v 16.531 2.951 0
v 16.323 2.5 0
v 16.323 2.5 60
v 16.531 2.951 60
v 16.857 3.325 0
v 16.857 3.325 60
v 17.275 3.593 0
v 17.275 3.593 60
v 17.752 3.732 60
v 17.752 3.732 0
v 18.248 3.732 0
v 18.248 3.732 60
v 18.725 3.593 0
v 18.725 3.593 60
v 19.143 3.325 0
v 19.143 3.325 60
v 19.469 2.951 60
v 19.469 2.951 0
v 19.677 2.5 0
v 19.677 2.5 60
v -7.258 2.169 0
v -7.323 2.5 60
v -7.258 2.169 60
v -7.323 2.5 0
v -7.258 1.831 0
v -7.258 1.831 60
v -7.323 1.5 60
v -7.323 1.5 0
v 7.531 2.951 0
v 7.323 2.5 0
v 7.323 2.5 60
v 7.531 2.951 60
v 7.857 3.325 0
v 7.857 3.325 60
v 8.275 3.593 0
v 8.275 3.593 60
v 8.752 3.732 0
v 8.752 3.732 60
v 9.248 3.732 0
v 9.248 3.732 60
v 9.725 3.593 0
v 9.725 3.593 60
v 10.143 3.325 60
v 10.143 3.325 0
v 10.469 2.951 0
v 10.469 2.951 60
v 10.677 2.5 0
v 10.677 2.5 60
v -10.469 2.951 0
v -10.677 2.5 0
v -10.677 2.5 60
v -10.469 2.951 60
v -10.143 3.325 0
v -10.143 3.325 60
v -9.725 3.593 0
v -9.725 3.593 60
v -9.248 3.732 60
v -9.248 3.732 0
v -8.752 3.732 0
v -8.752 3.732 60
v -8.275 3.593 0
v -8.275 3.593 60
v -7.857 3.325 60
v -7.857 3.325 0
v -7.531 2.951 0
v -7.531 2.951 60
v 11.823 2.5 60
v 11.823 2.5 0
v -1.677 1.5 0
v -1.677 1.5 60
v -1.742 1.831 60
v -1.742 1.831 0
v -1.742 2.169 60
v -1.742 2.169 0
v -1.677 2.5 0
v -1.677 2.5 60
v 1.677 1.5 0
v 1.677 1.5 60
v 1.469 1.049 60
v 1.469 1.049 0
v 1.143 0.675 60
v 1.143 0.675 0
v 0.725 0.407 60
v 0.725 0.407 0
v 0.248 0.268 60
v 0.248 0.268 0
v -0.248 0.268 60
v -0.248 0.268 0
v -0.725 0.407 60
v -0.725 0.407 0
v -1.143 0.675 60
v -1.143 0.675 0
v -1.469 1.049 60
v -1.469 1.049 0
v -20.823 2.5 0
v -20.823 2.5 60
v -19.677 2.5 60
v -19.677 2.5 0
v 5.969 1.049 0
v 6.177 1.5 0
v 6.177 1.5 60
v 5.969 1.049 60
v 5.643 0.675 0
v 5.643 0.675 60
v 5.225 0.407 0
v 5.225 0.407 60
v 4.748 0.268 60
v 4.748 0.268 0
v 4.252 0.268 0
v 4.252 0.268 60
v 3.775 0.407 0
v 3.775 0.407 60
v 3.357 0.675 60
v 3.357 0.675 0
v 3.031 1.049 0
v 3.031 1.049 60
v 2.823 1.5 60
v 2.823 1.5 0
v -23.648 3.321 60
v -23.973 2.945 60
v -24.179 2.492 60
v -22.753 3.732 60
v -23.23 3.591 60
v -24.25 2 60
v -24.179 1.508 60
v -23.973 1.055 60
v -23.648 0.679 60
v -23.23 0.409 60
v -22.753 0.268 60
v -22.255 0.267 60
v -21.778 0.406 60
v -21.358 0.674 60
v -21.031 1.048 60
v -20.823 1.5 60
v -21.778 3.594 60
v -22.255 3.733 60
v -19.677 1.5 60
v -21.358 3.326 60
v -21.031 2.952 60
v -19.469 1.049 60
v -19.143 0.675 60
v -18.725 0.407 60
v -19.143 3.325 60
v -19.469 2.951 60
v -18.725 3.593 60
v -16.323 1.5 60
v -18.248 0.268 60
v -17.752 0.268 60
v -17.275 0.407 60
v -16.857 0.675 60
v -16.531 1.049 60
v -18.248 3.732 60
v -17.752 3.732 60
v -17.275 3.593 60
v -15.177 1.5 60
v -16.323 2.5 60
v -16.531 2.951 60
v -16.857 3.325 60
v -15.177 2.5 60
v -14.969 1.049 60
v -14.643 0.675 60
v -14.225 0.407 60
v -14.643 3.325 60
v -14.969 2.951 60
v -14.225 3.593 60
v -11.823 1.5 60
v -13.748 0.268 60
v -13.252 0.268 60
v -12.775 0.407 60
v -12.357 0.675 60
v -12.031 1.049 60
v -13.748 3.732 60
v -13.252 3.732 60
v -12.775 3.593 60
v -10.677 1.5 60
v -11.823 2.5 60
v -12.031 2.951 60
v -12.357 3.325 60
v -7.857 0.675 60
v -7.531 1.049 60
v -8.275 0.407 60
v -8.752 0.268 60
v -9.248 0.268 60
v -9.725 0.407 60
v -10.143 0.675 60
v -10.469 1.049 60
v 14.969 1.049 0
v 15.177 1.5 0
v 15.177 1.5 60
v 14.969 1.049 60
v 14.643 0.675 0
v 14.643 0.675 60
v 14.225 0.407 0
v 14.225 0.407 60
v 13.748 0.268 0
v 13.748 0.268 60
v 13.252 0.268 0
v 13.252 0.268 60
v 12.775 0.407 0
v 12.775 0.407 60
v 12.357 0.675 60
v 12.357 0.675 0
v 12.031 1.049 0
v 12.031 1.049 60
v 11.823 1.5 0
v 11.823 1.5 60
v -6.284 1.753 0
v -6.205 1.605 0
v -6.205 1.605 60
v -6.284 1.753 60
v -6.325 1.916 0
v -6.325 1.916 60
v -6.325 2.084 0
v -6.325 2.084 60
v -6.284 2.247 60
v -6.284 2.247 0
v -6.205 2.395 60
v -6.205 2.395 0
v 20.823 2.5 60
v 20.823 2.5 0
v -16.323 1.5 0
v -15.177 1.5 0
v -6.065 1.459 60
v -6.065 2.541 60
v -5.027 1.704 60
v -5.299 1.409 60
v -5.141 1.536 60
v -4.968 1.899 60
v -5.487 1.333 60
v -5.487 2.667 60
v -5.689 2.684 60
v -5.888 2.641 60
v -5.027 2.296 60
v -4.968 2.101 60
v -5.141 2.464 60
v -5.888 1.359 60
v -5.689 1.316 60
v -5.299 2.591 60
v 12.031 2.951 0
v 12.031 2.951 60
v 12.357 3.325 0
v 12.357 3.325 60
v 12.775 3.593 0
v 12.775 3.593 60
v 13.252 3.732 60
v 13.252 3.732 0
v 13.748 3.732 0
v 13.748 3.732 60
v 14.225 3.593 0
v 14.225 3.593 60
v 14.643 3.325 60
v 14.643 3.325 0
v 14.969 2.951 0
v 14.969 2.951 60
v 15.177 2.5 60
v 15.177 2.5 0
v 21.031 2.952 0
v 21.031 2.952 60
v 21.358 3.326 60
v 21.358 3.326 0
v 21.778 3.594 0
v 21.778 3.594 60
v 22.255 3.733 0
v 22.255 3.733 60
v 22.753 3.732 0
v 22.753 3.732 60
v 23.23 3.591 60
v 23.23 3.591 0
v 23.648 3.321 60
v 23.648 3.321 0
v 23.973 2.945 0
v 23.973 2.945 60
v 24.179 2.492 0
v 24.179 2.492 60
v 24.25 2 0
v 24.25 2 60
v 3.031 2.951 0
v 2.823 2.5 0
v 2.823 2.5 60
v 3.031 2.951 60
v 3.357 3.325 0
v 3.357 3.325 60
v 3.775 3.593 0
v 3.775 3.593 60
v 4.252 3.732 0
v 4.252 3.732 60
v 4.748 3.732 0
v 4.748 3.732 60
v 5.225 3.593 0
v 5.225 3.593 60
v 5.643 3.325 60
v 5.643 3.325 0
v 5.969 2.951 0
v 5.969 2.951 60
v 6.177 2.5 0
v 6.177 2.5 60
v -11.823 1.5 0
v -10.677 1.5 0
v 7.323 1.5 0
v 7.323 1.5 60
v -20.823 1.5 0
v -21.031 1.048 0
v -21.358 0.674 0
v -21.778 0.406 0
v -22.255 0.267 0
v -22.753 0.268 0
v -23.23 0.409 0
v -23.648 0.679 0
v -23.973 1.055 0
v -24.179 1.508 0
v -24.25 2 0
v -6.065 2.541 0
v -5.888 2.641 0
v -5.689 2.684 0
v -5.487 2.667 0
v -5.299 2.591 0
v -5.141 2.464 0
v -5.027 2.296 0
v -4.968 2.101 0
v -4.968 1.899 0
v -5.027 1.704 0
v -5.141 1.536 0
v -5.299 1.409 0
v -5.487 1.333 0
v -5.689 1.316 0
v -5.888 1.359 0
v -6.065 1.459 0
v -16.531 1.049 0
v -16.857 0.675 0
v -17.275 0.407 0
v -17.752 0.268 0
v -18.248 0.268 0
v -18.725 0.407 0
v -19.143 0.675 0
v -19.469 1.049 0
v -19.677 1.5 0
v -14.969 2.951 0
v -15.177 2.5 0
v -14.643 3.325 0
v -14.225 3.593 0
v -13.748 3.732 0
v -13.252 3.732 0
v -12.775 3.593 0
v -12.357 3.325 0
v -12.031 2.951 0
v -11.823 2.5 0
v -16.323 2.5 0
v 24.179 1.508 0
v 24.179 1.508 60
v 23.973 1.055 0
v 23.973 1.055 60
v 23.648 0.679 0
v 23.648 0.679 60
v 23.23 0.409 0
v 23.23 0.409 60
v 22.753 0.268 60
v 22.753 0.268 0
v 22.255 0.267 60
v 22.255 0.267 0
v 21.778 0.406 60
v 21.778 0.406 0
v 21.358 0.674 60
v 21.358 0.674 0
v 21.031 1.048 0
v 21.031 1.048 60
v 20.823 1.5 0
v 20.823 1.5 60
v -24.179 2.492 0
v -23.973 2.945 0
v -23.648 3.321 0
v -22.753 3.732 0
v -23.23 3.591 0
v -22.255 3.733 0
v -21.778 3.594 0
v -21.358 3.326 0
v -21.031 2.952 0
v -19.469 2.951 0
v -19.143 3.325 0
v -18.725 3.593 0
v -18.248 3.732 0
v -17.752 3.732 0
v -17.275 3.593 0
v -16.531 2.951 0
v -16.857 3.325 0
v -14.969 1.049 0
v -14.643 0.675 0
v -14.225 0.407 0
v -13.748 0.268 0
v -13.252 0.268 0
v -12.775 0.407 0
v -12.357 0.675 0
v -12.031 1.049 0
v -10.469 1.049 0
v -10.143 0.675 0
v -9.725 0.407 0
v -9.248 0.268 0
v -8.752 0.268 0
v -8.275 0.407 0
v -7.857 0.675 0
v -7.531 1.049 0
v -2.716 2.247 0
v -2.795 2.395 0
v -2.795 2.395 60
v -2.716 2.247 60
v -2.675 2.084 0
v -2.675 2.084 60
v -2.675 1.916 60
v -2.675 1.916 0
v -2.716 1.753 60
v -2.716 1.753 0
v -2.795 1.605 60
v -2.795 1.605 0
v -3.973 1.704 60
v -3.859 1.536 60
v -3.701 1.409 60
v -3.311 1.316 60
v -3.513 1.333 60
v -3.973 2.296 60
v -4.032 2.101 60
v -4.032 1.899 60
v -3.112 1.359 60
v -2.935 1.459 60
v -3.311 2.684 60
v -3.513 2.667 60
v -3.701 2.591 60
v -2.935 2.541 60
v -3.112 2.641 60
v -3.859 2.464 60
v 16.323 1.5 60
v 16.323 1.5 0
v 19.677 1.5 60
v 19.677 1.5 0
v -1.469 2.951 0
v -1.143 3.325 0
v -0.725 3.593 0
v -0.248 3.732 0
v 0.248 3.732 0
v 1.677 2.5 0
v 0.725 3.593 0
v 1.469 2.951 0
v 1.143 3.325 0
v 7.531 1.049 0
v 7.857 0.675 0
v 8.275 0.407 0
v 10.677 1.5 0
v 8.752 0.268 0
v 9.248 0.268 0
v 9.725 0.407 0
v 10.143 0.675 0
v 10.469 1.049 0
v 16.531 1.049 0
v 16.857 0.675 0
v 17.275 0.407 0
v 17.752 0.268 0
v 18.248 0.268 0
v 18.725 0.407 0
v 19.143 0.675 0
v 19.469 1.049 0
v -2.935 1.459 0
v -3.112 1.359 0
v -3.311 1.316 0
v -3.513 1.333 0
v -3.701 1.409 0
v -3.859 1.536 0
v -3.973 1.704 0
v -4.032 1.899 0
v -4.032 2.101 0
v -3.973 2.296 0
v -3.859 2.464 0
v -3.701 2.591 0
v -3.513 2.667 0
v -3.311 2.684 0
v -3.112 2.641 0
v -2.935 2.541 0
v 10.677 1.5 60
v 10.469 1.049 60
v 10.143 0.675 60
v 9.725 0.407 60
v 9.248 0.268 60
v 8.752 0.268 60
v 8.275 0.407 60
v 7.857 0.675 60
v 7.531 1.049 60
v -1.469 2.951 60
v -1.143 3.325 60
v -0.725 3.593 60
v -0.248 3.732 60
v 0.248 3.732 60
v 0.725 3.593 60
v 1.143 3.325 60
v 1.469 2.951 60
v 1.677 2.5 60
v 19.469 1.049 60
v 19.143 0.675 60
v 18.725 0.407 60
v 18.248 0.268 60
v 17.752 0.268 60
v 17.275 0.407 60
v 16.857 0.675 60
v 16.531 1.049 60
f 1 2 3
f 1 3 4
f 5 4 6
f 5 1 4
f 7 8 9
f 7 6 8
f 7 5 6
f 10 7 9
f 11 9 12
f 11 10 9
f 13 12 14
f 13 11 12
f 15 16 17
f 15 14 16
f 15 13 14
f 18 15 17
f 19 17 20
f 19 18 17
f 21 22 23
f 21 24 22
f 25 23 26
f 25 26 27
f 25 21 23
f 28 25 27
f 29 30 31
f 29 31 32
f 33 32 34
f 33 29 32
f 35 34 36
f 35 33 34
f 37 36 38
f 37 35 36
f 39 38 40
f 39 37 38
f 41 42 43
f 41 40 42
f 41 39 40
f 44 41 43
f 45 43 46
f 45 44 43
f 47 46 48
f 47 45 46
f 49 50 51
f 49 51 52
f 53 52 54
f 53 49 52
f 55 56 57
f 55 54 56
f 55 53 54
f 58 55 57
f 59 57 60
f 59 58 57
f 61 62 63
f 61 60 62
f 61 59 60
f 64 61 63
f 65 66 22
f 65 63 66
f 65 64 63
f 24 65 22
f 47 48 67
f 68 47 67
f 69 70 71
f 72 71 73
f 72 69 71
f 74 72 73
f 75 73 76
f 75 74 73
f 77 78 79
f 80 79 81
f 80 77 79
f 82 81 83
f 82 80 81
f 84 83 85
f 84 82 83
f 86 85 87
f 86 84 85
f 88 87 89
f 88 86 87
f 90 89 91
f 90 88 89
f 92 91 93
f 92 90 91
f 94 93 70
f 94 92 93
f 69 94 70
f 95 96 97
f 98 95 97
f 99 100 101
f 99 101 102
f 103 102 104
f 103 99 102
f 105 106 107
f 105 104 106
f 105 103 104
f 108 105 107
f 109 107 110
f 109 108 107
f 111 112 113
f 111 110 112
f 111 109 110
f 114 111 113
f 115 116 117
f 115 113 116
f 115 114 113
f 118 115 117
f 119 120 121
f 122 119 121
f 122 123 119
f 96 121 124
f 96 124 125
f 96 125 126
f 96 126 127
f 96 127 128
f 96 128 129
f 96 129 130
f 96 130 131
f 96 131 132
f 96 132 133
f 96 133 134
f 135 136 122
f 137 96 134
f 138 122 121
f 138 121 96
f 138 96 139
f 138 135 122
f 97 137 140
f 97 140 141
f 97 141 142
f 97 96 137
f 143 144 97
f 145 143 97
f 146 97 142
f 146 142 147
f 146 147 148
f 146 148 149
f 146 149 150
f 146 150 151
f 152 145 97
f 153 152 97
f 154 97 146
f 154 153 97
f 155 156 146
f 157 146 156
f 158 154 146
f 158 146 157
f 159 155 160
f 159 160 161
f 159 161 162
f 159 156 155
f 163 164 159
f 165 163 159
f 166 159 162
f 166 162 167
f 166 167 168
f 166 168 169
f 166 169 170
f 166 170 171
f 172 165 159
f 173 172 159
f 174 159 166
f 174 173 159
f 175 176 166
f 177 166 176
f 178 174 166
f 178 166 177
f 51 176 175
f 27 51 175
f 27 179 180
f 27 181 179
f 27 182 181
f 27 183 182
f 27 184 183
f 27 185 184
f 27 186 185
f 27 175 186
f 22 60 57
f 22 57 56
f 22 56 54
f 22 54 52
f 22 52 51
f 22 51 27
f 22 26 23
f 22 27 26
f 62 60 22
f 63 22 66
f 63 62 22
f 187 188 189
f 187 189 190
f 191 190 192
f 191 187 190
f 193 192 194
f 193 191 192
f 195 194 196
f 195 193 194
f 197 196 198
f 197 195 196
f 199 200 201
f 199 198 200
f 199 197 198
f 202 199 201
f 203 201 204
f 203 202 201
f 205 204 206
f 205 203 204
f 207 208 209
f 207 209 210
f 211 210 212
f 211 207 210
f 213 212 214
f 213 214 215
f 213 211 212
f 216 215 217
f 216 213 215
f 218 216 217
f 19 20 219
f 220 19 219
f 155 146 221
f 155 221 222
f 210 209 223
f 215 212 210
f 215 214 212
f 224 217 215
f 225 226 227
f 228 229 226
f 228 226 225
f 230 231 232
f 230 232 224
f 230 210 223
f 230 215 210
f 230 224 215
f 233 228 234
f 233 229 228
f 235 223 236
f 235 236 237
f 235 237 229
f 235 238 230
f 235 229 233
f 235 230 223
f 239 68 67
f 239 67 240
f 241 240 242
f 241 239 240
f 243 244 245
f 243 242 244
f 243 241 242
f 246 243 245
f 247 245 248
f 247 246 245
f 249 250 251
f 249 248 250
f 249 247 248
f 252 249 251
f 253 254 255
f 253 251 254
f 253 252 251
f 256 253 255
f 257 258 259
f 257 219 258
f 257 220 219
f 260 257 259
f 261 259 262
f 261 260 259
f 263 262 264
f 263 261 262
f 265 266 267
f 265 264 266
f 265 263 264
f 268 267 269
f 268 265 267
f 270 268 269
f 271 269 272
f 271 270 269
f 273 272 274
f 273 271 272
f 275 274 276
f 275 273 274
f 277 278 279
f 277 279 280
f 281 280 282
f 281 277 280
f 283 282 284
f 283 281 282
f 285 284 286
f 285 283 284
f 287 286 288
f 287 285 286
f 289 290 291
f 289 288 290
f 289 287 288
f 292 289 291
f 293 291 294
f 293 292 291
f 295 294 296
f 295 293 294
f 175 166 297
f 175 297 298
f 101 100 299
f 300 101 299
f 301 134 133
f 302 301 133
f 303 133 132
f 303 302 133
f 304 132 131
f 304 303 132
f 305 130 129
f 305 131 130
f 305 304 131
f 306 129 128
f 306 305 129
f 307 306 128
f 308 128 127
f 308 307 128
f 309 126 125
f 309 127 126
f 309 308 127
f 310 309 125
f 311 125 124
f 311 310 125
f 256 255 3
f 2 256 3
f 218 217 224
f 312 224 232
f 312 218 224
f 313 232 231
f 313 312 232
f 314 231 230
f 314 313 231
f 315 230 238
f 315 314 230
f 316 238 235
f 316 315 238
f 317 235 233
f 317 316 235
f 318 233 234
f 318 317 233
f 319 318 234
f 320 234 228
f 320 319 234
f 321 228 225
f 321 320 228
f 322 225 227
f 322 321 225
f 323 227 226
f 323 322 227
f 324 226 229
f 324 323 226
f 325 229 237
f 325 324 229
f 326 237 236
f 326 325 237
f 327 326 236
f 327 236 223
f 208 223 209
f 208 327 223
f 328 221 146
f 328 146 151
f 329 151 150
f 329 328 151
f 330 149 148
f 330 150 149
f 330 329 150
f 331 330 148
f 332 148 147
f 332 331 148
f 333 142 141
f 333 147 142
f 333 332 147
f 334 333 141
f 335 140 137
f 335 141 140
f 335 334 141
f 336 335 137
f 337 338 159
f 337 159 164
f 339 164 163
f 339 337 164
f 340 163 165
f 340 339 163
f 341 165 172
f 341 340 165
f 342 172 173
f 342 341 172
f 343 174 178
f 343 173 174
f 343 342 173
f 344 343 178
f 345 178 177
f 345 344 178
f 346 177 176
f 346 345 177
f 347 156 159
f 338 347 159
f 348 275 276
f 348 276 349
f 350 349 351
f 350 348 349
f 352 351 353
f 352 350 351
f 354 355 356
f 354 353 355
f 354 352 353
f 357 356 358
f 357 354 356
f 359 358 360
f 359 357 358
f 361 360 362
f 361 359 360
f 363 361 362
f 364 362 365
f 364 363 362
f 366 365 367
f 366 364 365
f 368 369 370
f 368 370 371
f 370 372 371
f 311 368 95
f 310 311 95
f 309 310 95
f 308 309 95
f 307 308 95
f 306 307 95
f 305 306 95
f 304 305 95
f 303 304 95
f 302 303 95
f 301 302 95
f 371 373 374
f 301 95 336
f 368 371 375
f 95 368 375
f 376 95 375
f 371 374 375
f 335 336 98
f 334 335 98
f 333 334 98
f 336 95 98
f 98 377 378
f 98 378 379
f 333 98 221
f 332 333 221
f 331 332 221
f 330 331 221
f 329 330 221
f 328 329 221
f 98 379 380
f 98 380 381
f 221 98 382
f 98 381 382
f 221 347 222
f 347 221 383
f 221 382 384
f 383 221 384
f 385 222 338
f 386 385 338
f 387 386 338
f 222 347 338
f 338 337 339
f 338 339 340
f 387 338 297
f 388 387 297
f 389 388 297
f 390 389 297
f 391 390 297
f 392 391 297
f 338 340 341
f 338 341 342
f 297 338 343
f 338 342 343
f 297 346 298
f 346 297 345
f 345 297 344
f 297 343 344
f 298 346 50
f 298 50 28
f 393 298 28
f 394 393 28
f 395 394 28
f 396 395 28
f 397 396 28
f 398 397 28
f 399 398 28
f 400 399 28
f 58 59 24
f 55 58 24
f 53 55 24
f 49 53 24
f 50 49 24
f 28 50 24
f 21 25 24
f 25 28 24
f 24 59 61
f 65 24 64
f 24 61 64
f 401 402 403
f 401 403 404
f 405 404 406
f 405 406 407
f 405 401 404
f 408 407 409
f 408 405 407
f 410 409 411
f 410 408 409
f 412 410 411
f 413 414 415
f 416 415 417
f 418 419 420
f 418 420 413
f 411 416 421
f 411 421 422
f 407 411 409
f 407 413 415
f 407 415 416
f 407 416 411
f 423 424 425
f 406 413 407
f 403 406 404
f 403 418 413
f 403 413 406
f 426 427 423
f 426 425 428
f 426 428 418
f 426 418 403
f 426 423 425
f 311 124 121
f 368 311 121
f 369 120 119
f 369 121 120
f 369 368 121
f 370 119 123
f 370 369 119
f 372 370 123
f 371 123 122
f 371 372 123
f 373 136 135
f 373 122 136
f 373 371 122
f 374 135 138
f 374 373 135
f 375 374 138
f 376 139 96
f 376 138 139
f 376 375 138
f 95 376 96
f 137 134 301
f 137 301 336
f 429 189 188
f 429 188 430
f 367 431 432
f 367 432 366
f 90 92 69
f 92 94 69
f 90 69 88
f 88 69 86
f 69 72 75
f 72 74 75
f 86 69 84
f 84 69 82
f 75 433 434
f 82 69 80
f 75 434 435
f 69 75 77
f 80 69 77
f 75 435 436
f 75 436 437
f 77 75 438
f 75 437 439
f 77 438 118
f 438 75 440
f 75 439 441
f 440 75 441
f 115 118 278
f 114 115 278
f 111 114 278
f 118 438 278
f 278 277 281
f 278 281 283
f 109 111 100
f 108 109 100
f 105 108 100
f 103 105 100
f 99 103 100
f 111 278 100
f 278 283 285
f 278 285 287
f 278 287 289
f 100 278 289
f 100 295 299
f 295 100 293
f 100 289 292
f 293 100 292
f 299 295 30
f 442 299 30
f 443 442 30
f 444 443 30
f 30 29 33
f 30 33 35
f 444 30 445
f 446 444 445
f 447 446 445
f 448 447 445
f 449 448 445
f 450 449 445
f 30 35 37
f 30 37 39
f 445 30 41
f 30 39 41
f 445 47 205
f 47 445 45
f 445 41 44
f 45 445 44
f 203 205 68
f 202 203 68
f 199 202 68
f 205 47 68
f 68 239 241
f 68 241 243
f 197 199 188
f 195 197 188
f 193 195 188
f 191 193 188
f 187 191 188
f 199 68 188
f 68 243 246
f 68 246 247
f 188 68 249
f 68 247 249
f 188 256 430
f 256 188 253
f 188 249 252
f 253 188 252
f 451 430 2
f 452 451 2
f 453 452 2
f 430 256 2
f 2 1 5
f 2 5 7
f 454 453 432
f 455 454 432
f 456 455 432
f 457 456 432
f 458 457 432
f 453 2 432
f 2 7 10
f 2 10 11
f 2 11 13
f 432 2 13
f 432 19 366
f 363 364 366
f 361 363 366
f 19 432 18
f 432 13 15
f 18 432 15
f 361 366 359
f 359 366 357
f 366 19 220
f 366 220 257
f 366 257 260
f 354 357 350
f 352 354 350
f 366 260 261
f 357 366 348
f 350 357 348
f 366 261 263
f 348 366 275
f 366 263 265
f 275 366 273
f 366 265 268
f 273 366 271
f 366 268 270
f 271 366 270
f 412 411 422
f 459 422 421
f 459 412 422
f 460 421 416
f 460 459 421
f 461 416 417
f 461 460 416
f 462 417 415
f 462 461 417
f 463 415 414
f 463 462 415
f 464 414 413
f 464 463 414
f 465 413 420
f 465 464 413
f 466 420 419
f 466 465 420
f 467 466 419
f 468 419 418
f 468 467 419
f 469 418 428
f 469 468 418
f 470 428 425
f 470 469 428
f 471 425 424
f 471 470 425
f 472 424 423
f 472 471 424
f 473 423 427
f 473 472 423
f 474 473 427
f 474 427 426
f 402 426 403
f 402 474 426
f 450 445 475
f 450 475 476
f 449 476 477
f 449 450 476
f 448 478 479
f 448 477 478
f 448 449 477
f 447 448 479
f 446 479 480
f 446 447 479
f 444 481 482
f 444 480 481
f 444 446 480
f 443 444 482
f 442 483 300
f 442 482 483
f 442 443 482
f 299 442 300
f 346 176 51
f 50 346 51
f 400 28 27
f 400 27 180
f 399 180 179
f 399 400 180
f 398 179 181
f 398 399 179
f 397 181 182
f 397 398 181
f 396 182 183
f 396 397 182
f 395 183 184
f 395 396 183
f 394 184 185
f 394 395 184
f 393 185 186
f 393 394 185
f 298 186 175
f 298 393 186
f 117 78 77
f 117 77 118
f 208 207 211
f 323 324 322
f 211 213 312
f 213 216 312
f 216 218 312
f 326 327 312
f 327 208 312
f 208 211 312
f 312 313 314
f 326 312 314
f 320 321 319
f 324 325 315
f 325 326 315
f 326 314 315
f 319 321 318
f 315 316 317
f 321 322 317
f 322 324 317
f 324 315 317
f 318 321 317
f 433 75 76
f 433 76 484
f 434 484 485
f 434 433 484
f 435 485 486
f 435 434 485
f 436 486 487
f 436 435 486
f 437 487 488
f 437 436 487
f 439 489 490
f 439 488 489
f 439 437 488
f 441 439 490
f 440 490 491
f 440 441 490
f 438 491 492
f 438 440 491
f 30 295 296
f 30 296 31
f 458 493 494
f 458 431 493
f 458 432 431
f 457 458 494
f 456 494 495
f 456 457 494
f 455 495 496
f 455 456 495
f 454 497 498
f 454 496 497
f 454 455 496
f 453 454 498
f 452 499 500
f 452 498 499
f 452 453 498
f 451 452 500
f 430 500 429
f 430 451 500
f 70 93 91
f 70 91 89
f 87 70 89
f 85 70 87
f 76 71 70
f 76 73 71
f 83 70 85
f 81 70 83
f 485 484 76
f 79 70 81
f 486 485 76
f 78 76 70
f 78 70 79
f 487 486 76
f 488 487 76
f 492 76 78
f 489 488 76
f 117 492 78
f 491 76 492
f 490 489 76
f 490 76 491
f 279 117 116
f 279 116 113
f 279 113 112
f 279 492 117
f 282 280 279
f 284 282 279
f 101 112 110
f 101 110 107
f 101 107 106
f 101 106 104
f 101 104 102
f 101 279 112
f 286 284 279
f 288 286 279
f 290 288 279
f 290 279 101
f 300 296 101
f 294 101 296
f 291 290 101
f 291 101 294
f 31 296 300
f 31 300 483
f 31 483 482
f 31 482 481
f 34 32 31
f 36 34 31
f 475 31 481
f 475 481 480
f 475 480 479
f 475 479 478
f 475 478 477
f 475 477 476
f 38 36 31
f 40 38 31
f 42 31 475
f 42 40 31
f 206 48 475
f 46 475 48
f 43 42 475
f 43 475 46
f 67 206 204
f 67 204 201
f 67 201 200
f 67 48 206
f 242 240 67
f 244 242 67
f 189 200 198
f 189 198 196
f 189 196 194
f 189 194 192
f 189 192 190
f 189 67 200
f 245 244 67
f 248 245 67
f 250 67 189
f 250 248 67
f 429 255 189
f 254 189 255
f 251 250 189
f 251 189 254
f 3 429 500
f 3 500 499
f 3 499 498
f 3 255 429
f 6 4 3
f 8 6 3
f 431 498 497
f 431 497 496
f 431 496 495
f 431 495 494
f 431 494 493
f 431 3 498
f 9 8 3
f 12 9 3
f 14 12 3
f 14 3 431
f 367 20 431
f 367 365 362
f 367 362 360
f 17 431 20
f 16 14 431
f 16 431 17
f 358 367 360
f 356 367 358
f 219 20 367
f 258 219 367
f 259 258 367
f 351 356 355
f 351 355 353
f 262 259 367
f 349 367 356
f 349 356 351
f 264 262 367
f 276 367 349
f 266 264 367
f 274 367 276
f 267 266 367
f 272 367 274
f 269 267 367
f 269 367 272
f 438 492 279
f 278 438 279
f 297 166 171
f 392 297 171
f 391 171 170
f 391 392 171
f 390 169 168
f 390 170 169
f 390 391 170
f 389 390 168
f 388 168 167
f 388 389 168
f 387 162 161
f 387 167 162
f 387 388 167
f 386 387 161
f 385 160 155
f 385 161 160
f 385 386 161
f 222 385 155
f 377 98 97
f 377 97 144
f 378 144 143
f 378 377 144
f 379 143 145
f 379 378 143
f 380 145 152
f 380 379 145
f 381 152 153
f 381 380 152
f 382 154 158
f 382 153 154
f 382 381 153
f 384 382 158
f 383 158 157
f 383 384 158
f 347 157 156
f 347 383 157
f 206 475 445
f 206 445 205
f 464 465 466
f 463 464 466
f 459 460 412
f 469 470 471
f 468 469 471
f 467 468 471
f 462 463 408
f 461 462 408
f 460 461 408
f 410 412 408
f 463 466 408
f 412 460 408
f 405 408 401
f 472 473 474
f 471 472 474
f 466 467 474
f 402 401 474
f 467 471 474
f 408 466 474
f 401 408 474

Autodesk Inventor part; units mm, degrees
ref_plane "YZ Plane" through (0, 0, 0) normal (1, 0, 0) x (0, 1, 0)
ref_plane "XZ Plane" through (0, 0, 0) normal (0, 1, 0) x (-1, 0, 0)
ref_plane "XY Plane" through (0, 0, 0) normal (0, 0, 1) x (1, 0, 0)
sketch "Sketch1" plane through (0, 0, 0) normal (0, 0, 1) x (1, 0, 0)
  line L0 (25, -2) -> (24.25, -2) projected
  line L1 (25, 2) -> (25, -2) projected
  line L2 (24.25, 2) -> (25, 2) projected
  arc A0 (20.8229, 1.5) -> (24.25, 2) centre (22.5, 2) ccw projected
  line L3 (19.6771, 1.5) -> (20.8229, 1.5) projected
  arc A1 (16.3229, 1.5) -> (19.6771, 1.5) centre (18, 2) ccw projected
  line L4 (15.1771, 1.5) -> (16.3229, 1.5) projected
  arc A2 (11.8229, 1.5) -> (15.1771, 1.5) centre (13.5, 2) ccw projected
  line L5 (10.6771, 1.5) -> (11.8229, 1.5) projected
  arc A3 (7.3229, 1.5) -> (10.6771, 1.5) centre (9, 2) ccw projected
  line L6 (6.1771, 1.5) -> (7.3229, 1.5) projected
  arc A4 (2.8229, 1.5) -> (6.1771, 1.5) centre (4.5, 2) ccw projected
  line L7 (1.6771, 1.5) -> (2.8229, 1.5) projected
  arc A5 (-1.6771, 1.5) -> (1.6771, 1.5) centre (0, 2) ccw projected
  line L8 (-2.8229, 1.5) -> (-1.6771, 1.5) projected
  arc A6 (-6.1771, 1.5) -> (-2.8229, 1.5) centre (-4.5, 2) ccw projected
  line L9 (-7.3229, 1.5) -> (-6.1771, 1.5) projected
  arc A7 (-10.6771, 1.5) -> (-7.3229, 1.5) centre (-9, 2) ccw projected
  line L10 (-11.8229, 1.5) -> (-10.6771, 1.5) projected
  arc A8 (-15.1771, 1.5) -> (-11.8229, 1.5) centre (-13.5, 2) ccw projected
  line L11 (-16.3229, 1.5) -> (-15.1771, 1.5) projected
  arc A9 (-19.6771, 1.5) -> (-16.3229, 1.5) centre (-18, 2) ccw projected
  line L12 (-20.8229, 1.5) -> (-19.6771, 1.5) projected
  arc A10 (-24.25, 2) -> (-20.8229, 1.5) centre (-22.5, 2) ccw projected
  line L13 (-25, 2) -> (-24.25, 2) projected
  line L14 (-25, -2) -> (-25, 2) projected
  line L15 (-24.25, -2) -> (-25, -2) projected
  arc A11 (-20.8229, -1.5) -> (-24.25, -2) centre (-22.5, -2) ccw projected
  line L16 (-19.6771, -1.5) -> (-20.8229, -1.5) projected
  arc A12 (-16.3229, -1.5) -> (-19.6771, -1.5) centre (-18, -2) ccw projected
  line L17 (-15.1771, -1.5) -> (-16.3229, -1.5) projected
  arc A13 (-11.8229, -1.5) -> (-15.1771, -1.5) centre (-13.5, -2) ccw projected
  line L18 (-10.6771, -1.5) -> (-11.8229, -1.5) projected
  arc A14 (-7.3229, -1.5) -> (-10.6771, -1.5) centre (-9, -2) ccw projected
  line L19 (-6.1771, -1.5) -> (-7.3229, -1.5) projected
  arc A15 (-2.8229, -1.5) -> (-6.1771, -1.5) centre (-4.5, -2) ccw projected
  line L20 (-1.6771, -1.5) -> (-2.8229, -1.5) projected
  arc A16 (1.6771, -1.5) -> (-1.6771, -1.5) centre (0, -2) ccw projected
  line L21 (2.8229, -1.5) -> (1.6771, -1.5) projected
  arc A17 (6.1771, -1.5) -> (2.8229, -1.5) centre (4.5, -2) ccw projected
  line L22 (7.3229, -1.5) -> (6.1771, -1.5) projected
  arc A18 (10.6771, -1.5) -> (7.3229, -1.5) centre (9, -2) ccw projected
  line L23 (11.8229, -1.5) -> (10.6771, -1.5) projected
  arc A19 (15.1771, -1.5) -> (11.8229, -1.5) centre (13.5, -2) ccw projected
  line L24 (16.3229, -1.5) -> (15.1771, -1.5) projected
  arc A20 (19.6771, -1.5) -> (16.3229, -1.5) centre (18, -2) ccw projected
  line L25 (20.8229, -1.5) -> (19.6771, -1.5) projected
  arc A21 (24.25, -2) -> (20.8229, -1.5) centre (22.5, -2) ccw projected
  arc A22 (-8.7265, 4.65) -> (-8.4667, 4.5) centre (-8.4667, 4.8) ccw projected
  line L26 (-8.7265, 4.65) -> (-9.1941, 5.46) projected
  line L27 (-9.1941, 5.46) -> (-10.1962, 5.46) projected
  arc A23 (-12.1962, 5.46) -> (-10.1962, 5.46) centre (-11.1962, 5.46) ccw projected
  line L28 (-12.1962, 5.46) -> (-15.6962, 5.46) projected
  arc A24 (-17.6962, 5.46) -> (-15.6962, 5.46) centre (-16.6962, 5.46) ccw projected
  line L29 (-17.6962, 5.46) -> (-18.6983, 5.46) projected
  line L30 (-18.6983, 5.46) -> (-19.1659, 4.65) projected
  arc A25 (-19.4258, 4.5) -> (-19.1659, 4.65) centre (-19.4258, 4.8) ccw projected
  line L31 (-19.4258, 4.5) -> (-24, 4.5) projected
  arc A26 (-24, 4.5) -> (-25, 3.5) centre (-24, 3.5) ccw projected
  line L32 (-25, 3.5) -> (-25, 2) projected
  line L33 (-25, 2) -> (-24.25, 2) projected
  arc A27 (-20.8229, 2.5) -> (-24.25, 2) centre (-22.5, 2) ccw projected
  line L34 (-20.8229, 2.5) -> (-19.6771, 2.5) projected
  arc A28 (-16.3229, 2.5) -> (-19.6771, 2.5) centre (-18, 2) ccw projected
  line L35 (-16.3229, 2.5) -> (-15.1771, 2.5) projected
  arc A29 (-11.8229, 2.5) -> (-15.1771, 2.5) centre (-13.5, 2) ccw projected
  line L36 (-11.8229, 2.5) -> (-10.6771, 2.5) projected
  arc A30 (-7.3229, 2.5) -> (-10.6771, 2.5) centre (-9, 2) ccw projected
  line L37 (-7.3229, 2.5) -> (-6.1771, 2.5) projected
  arc A31 (-2.8229, 2.5) -> (-6.1771, 2.5) centre (-4.5, 2) ccw projected
  line L38 (-2.8229, 2.5) -> (-1.6771, 2.5) projected
  arc A32 (1.6771, 2.5) -> (-1.6771, 2.5) centre (0, 2) ccw projected
  line L39 (1.6771, 2.5) -> (2.8229, 2.5) projected
  arc A33 (6.1771, 2.5) -> (2.8229, 2.5) centre (4.5, 2) ccw projected
  line L40 (6.1771, 2.5) -> (7.3229, 2.5) projected
  arc A34 (10.6771, 2.5) -> (7.3229, 2.5) centre (9, 2) ccw projected
  line L41 (10.6771, 2.5) -> (11.8229, 2.5) projected
  arc A35 (15.1771, 2.5) -> (11.8229, 2.5) centre (13.5, 2) ccw projected
  line L42 (15.1771, 2.5) -> (16.3229, 2.5) projected
  arc A36 (19.6771, 2.5) -> (16.3229, 2.5) centre (18, 2) ccw projected
  line L43 (19.6771, 2.5) -> (20.8229, 2.5) projected
  arc A37 (24.25, 2) -> (20.8229, 2.5) centre (22.5, 2) ccw projected
  line L44 (24.25, 2) -> (25, 2) projected
  line L45 (25, 2) -> (25, 3.5) projected
  arc A38 (25, 3.5) -> (24, 4.5) centre (24, 3.5) ccw projected
  line L46 (24, 4.5) -> (-8.4667, 4.5) projected
  circle A39 centre (0, 2) radius 1.75
  circle A40 centre (-9, 2) radius 1.75
  circle A41 centre (-5.645, 2) radius 0.685
  circle A42 centre (-3.355, 2) radius 0.685
  line L47 (-4.5, 2) -> (-6.519, 2) construction
  line L48 (-7.3229, 1.5) -> (-6.1771, 1.5)
  line L49 (-2.8229, 1.5) -> (-1.6771, 1.5)
  line L50 (-1.6771, 2.5) -> (-2.8229, 2.5)
  circle A43 centre (-4.5, 2) radius 1.75
  line L51 (-6.1771, 2.5) -> (-7.3229, 2.5)
  point P0 (0, 0)
  dimension "d2" = 1.37
  dimension "d3" = 1.37
  dimension "d4" = 3.355
  dimension "d5" = 3.355
extrude "Extrusion1" add sketch "Sketch1" along normal blind 60 contours A0 L3 A1 L4 A2 L5 A3 L6 A4 L7 A39 L39 A33 L40 A34 L41 A35 L42 A36 L43 A37 | A5 A39 A32 | L8 A43 A42 L38 A39 | L9 A40 L37 A43 A41 | A43 A42 | A42 A43 | A7 A40 A30 | A43 A41 | A41 A43 | L10 A8 L11 A9 L12 A10 A27 L34 A28 L35 A29 L36 A40
sketch "Sketch2" plane through (0, 0, 0) normal (0, 0, -1) x (-1, 0, 0)
  arc A0 (7.3229, 1.5) -> (10.6771, 1.5) centre (9, 2) ccw projected
  circle A1 centre (9, 2) radius 1.75
  arc A2 (10.6771, 2.5) -> (7.3229, 2.5) centre (9, 2) ccw projected
  line L0 (7.3229, 2.5) -> (6.1771, 2.5)
  arc A3 (6.2049, 2.3946) -> (6.2049, 1.6054) centre (5.645, 2) ccw projected
  circle A4 centre (5.645, 2) radius 0.685
  arc A5 (6.1771, 1.5) -> (6.2049, 1.6054) centre (4.5, 2) ccw projected
  line L1 (6.1771, 1.5) -> (6.2049, 1.6054)
  arc A6 (6.2049, 2.3946) -> (6.1771, 2.5) centre (4.5, 2) ccw projected
  line L2 (6.1771, 2.5) -> (6.2049, 2.3946)
  line L3 (6.1771, 1.5) -> (6.1771, 1.3136)
  line L4 (6.1771, 1.3136) -> (7.3763, 1.3471)
  line L5 (6.1771, 2.5) -> (6.1771, 2.7093)
  line L6 (6.1771, 2.7093) -> (7.416, 2.744)
  line L7 (4.5, 2) -> (4.5, 1.3471) construction
  arc A7 (-1.6771, 1.5) -> (1.6771, 1.5) centre (0, 2) ccw
  circle A8 centre (0, 2) radius 1.75
  arc A9 (1.6771, 2.5) -> (-1.6771, 2.5) centre (0, 2) ccw
  line L8 (1.6771, 2.5) -> (2.8229, 2.5)
  arc A10 (2.7951, 1.6054) -> (2.7951, 2.3946) centre (3.355, 2) ccw
  circle A11 centre (3.355, 2) radius 0.685
  arc A12 (2.7951, 1.6054) -> (2.8229, 1.5) centre (4.5, 2) ccw
  line L9 (2.8229, 1.5) -> (2.7951, 1.6054)
  arc A13 (2.8229, 2.5) -> (2.7951, 2.3946) centre (4.5, 2) ccw
  line L10 (2.8229, 2.5) -> (2.7951, 2.3946)
  line L11 (2.8229, 2.5) -> (2.8229, 2.7093)
  line L12 (2.8229, 2.7093) -> (1.584, 2.744)
  line L13 (2.8229, 1.5) -> (2.8229, 1.3136)
  line L14 (2.8229, 1.3136) -> (1.6237, 1.3471)
  point P0 (0, 0)
  dimension "d6" = 3.5
  dimension "d7" = 1.37
extrude "Extrusion2" cut sketch "Sketch2" against normal blind 73.5 contours A0 L4 L3 A5 A4 A6 L0 A1 | A7 A8 L8 A13 A11 A12 L13 L14
properties part number "3d_LM-Welding_Tooling - Wire Jacket"
